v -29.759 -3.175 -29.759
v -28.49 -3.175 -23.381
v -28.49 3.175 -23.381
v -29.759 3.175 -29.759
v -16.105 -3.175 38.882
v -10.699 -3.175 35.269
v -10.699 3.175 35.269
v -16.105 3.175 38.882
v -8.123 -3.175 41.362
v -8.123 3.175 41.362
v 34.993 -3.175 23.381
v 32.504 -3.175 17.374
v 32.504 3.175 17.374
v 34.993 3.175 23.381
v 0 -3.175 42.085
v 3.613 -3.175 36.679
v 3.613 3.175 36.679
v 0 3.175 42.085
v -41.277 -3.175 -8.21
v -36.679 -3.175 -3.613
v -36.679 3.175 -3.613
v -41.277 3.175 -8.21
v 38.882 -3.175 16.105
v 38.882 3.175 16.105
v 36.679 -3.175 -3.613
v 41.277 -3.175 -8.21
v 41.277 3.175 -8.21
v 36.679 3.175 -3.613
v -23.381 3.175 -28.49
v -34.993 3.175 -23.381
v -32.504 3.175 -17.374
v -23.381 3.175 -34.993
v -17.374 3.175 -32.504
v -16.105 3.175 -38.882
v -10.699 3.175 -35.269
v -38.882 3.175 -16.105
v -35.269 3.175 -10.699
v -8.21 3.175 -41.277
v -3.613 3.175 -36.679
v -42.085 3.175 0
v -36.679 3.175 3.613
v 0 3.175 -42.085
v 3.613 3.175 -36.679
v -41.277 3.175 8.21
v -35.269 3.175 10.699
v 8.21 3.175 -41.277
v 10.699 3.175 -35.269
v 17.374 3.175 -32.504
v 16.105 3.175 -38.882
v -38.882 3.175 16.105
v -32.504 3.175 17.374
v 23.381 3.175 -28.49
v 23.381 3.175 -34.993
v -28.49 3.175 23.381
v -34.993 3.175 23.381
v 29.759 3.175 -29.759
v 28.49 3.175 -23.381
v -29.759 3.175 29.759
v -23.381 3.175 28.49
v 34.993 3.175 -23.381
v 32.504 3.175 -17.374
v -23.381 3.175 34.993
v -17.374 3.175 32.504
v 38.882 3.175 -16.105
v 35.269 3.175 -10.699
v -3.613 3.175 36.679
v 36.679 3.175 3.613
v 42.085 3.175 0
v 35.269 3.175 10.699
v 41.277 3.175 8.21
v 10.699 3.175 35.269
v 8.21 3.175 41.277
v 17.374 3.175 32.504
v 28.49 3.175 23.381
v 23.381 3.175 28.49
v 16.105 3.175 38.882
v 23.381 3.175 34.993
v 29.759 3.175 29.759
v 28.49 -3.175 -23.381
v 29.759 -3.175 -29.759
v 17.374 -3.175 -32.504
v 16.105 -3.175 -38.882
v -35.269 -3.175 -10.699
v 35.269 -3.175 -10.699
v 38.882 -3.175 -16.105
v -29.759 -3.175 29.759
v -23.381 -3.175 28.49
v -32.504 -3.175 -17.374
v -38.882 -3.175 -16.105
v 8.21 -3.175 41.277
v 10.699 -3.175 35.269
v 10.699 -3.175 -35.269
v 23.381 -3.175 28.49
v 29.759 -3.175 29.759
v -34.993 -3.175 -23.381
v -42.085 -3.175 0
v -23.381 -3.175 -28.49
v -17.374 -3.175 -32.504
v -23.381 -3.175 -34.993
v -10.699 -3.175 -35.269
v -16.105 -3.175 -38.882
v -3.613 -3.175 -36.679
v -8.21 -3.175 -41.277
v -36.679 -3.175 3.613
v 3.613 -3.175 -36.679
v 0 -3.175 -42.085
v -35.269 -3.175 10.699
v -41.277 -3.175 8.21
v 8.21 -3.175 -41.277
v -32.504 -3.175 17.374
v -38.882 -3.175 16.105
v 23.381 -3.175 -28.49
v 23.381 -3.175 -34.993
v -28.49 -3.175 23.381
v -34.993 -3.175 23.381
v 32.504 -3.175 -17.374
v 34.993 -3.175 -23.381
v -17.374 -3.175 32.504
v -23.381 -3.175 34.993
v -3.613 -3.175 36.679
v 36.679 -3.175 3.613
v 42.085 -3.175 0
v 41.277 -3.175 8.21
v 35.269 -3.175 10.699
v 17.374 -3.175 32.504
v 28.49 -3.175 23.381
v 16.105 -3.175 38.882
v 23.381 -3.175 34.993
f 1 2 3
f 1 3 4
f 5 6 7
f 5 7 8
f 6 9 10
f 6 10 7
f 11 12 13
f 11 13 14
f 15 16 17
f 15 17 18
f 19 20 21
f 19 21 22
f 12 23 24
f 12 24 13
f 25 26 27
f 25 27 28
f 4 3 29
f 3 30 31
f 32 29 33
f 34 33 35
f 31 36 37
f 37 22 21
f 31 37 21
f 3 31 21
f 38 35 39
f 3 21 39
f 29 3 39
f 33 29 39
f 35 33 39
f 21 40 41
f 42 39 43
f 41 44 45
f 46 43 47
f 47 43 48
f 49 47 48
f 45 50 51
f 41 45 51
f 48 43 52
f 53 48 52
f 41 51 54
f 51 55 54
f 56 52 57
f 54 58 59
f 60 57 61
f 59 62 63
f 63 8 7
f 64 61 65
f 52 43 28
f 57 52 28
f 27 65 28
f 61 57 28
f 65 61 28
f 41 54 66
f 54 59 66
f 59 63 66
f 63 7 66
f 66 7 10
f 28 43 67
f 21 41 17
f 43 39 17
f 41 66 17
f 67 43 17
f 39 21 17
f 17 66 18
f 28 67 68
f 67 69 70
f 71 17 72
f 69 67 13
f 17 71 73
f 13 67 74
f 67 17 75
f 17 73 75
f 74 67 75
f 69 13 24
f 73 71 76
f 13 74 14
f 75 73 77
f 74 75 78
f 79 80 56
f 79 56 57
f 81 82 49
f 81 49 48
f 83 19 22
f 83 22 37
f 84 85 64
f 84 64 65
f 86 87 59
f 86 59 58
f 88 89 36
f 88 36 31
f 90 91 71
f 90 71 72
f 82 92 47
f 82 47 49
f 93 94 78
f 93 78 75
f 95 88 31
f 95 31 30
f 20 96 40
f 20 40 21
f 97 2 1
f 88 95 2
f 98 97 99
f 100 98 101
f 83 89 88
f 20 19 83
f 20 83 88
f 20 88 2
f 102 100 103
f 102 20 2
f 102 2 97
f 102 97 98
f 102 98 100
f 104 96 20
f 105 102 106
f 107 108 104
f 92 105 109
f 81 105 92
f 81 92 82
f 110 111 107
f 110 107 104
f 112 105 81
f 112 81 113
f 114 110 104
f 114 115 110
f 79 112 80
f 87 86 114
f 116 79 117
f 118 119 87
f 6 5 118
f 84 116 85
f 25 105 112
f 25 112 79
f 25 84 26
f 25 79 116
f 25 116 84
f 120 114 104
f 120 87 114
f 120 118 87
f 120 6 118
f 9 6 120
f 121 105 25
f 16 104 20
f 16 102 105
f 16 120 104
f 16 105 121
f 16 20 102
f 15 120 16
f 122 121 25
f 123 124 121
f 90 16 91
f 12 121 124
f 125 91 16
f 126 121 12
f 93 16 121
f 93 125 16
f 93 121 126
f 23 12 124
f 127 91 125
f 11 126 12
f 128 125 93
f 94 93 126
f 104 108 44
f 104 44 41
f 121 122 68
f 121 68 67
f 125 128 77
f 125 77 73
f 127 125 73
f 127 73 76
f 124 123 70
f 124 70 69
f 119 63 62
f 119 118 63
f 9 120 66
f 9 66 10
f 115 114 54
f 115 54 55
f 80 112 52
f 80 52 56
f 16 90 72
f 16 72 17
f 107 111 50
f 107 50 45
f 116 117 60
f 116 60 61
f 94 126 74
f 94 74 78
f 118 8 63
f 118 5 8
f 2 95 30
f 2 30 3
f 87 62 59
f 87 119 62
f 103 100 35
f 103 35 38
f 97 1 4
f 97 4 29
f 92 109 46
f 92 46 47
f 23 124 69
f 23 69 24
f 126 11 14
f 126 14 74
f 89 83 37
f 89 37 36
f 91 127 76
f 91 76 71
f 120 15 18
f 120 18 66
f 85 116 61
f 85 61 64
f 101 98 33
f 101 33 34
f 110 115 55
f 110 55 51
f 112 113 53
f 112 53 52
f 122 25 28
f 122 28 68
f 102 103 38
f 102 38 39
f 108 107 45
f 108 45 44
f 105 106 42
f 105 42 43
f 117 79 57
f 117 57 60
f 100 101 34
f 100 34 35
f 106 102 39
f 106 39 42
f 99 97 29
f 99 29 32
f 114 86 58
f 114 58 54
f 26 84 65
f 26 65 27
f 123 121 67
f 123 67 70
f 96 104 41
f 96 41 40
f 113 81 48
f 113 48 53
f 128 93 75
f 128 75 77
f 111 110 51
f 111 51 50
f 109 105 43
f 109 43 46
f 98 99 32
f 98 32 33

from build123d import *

# Parameters (mm, degrees)
F1_DEPTH = 3.175


with BuildPart() as f1:
    # F0 (on Front) → F1 (new body, symmetric)
    with BuildSketch(Plane.XZ):
        Polygon((-23.3813293569, 34.9926322543), (-23.3813293569, 28.4902322543), (-17.3738950847, 32.5042715037), align=None)
        Polygon((-17.3738950847, 32.5042715037), (-23.3813293569, 28.4902322543), (-28.4902322543, 23.3813293569), (-32.5042715037, 17.3738950847), (-35.2691898278, 10.6987917678), (-36.678732966, 3.6125398832), (-36.678732966, -3.6125398832), (-35.2691898278, -10.6987917678), (-32.5042715037, -17.3738950847), (-28.4902322543, -23.3813293569), (-23.3813293569, -28.4902322543), (-17.3738950847, -32.5042715037), (-10.6987917678, -35.2691898278), (-3.6125398832, -36.678732966), (3.6125398832, -36.678732966), (10.6987917678, -35.2691898278), (17.3738950847, -32.5042715037), (23.3813293569, -28.4902322543), (28.4902322543, -23.3813293569), (32.5042715037, -17.3738950847), (35.2691898278, -10.6987917678), (36.678732966, -3.6125398832), (36.678732966, 3.6125398832), (35.2691898278, 10.6987917678), (32.5042715037, 17.3738950847), (28.4902322543, 23.3813293569), (23.3813293569, 28.4902322543), (17.3738950847, 32.5042715037), (10.6987917678, 35.2691898278), (3.6125398832, 36.678732966), (-3.6125398832, 36.678732966), (-10.6987917678, 35.2691898278), align=None)
        Polygon((-28.4902322543, 23.3813293569), (-23.3813293569, 28.4902322543), (-29.7587875642, 29.7587875642), align=None)
        Polygon((-16.1053397748, 38.881729711), (-17.3738950847, 32.5042715037), (-10.6987917678, 35.2691898278), align=None)
        Polygon((-32.5042715037, 17.3738950847), (-28.4902322543, 23.3813293569), (-34.9926322543, 23.3813293569), align=None)
        Polygon((-8.1233671151, 41.3620697513), (-10.6987917678, 35.2691898278), (-3.6125398832, 36.678732966), align=None)
        Polygon((-35.2691898278, 10.6987917678), (-32.5042715037, 17.3738950847), (-38.881729711, 16.1053397748), align=None)
        Polygon((0, 42.0852809731), (-3.6125398832, 36.678732966), (3.6125398832, 36.678732966), align=None)
        Polygon((-36.678732966, 3.6125398832), (-35.2691898278, 10.6987917678), (-41.2766241, 8.2104310172), align=None)
        Polygon((8.2104310172, 41.2766241), (3.6125398832, 36.678732966), (10.6987917678, 35.2691898278), align=None)
        Polygon((-36.678732966, -3.6125398832), (-36.678732966, 3.6125398832), (-42.0852809731, 0), align=None)
        Polygon((16.1053397748, 38.881729711), (10.6987917678, 35.2691898278), (17.3738950847, 32.5042715037), align=None)
        Polygon((-35.2691898278, -10.6987917678), (-36.678732966, -3.6125398832), (-41.2766241, -8.2104310172), align=None)
        Polygon((23.3813293569, 34.9926322543), (17.3738950847, 32.5042715037), (23.3813293569, 28.4902322543), align=None)
        Polygon((-32.5042715037, -17.3738950847), (-35.2691898278, -10.6987917678), (-38.881729711, -16.1053397748), align=None)
        Polygon((29.7587875642, 29.7587875642), (23.3813293569, 28.4902322543), (28.4902322543, 23.3813293569), align=None)
        Polygon((-28.4902322543, -23.3813293569), (-32.5042715037, -17.3738950847), (-34.9926322543, -23.3813293569), align=None)
        Polygon((34.9926322543, 23.3813293569), (28.4902322543, 23.3813293569), (32.5042715037, 17.3738950847), align=None)
        Polygon((-23.3813293569, -28.4902322543), (-28.4902322543, -23.3813293569), (-29.7587875642, -29.7587875642), align=None)
        Polygon((38.881729711, 16.1053397748), (32.5042715037, 17.3738950847), (35.2691898278, 10.6987917678), align=None)
        Polygon((-17.3738950847, -32.5042715037), (-23.3813293569, -28.4902322543), (-23.3813293569, -34.9926322543), align=None)
        Polygon((41.2766241, 8.2104310172), (35.2691898278, 10.6987917678), (36.678732966, 3.6125398832), align=None)
        Polygon((-10.6987917678, -35.2691898278), (-17.3738950847, -32.5042715037), (-16.1053397748, -38.881729711), align=None)
        Polygon((42.0852809731, 0), (36.678732966, 3.6125398832), (36.678732966, -3.6125398832), align=None)
        Polygon((-3.6125398832, -36.678732966), (-10.6987917678, -35.2691898278), (-8.2104310172, -41.2766241), align=None)
        Polygon((41.2766241, -8.2104310172), (36.678732966, -3.6125398832), (35.2691898278, -10.6987917678), align=None)
        Polygon((3.6125398832, -36.678732966), (-3.6125398832, -36.678732966), (0, -42.0852809731), align=None)
        Polygon((38.881729711, -16.1053397748), (35.2691898278, -10.6987917678), (32.5042715037, -17.3738950847), align=None)
        Polygon((10.6987917678, -35.2691898278), (3.6125398832, -36.678732966), (8.2104310172, -41.2766241), align=None)
        Polygon((34.9926322543, -23.3813293569), (32.5042715037, -17.3738950847), (28.4902322543, -23.3813293569), align=None)
        Polygon((17.3738950847, -32.5042715037), (10.6987917678, -35.2691898278), (16.1053397748, -38.881729711), align=None)
        Polygon((29.7587875642, -29.7587875642), (28.4902322543, -23.3813293569), (23.3813293569, -28.4902322543), align=None)
        Polygon((23.3813293569, -28.4902322543), (17.3738950847, -32.5042715037), (23.3813293569, -34.9926322543), align=None)
    extrude(amount=F1_DEPTH, both=True)


solid = f1.part
